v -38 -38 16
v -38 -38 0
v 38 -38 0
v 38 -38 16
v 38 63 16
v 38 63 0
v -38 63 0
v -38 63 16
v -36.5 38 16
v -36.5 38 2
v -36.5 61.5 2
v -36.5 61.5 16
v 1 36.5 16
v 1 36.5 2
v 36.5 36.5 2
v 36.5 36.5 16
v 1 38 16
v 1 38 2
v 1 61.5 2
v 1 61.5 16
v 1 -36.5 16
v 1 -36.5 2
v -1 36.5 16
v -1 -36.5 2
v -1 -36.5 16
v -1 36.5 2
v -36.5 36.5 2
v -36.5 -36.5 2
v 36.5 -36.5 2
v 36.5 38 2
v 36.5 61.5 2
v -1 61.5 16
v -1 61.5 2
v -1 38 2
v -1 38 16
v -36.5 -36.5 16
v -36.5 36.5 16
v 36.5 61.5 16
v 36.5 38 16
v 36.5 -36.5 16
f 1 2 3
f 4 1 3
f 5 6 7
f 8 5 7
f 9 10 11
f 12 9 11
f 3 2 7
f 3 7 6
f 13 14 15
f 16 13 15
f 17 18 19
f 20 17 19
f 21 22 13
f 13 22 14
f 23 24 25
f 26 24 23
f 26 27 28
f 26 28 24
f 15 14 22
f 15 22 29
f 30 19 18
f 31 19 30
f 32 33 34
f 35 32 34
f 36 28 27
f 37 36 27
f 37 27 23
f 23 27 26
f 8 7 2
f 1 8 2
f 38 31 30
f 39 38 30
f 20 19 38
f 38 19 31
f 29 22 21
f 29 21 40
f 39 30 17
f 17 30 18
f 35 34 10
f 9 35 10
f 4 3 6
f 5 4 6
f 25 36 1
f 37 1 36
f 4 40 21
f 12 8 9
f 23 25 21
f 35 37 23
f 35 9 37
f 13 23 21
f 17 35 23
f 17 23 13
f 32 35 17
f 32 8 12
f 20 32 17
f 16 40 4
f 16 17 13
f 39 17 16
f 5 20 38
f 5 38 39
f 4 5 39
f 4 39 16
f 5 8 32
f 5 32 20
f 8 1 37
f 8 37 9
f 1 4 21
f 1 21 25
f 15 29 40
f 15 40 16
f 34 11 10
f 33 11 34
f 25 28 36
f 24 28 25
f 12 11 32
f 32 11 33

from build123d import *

# Parameters (mm, degrees)
F1_W     = 73
F1_H     = 73
F2_DEPTH = 16
F3_DEPTH = 2
F4_W     = 2
F4_H     = 73
F5_DEPTH = 14
F0_W     = 35.5
F0_H     = 23.5
F6_DEPTH = 2
F7_DEPTH = 2
F8_DEPTH = 16


with BuildPart() as f2:
    # F1 (on face) → F2 (new body)
    with BuildSketch(Plane.XY):
        Polygon((-38, 38), (-38, -38), (38, -38), (38, 38), (36.5, 38), (1, 38), (-1, 38), (-36.5, 38), align=None)
        Rectangle(F1_W, F1_H, mode=Mode.SUBTRACT)
    extrude(amount=F2_DEPTH)

    # F0 (on Top) → F3 (join)
    with BuildSketch(Plane.XY):
        Polygon((-38, -38), (38, -38), (38, 38), (36.5, 38), (1, 38), (-1, 38), (-36.5, 38), (-38, 38), align=None)
    extrude(amount=F3_DEPTH)

    # F4 (on face) → F5 (join)
    with BuildSketch(Plane.XY.offset(2)):
        Rectangle(F4_W, F4_H)
    extrude(amount=F5_DEPTH)

    # F0 (on Top) → F6 (join)
    with BuildSketch(Plane.XY):
        with Locations((-18.75, 49.75)):
            Rectangle(F0_W, F0_H)
    extrude(amount=F6_DEPTH)

    # F0 (on Top) → F7 (join)
    with BuildSketch(Plane.XY):
        with Locations((18.75, 49.75)):
            Rectangle(F0_W, F0_H)
    extrude(amount=F7_DEPTH)

    # F0 (on Top) → F8 (join)
    with BuildSketch(Plane.XY):
        Polygon((36.5, 38), (38, 38), (38, 63), (-38, 63), (-38, 38), (-36.5, 38), (-36.5, 61.5), (-1, 61.5), (-1, 38), (1, 38), (1, 61.5), (36.5, 61.5), align=None)
    extrude(amount=F8_DEPTH)


solid = f2.part
